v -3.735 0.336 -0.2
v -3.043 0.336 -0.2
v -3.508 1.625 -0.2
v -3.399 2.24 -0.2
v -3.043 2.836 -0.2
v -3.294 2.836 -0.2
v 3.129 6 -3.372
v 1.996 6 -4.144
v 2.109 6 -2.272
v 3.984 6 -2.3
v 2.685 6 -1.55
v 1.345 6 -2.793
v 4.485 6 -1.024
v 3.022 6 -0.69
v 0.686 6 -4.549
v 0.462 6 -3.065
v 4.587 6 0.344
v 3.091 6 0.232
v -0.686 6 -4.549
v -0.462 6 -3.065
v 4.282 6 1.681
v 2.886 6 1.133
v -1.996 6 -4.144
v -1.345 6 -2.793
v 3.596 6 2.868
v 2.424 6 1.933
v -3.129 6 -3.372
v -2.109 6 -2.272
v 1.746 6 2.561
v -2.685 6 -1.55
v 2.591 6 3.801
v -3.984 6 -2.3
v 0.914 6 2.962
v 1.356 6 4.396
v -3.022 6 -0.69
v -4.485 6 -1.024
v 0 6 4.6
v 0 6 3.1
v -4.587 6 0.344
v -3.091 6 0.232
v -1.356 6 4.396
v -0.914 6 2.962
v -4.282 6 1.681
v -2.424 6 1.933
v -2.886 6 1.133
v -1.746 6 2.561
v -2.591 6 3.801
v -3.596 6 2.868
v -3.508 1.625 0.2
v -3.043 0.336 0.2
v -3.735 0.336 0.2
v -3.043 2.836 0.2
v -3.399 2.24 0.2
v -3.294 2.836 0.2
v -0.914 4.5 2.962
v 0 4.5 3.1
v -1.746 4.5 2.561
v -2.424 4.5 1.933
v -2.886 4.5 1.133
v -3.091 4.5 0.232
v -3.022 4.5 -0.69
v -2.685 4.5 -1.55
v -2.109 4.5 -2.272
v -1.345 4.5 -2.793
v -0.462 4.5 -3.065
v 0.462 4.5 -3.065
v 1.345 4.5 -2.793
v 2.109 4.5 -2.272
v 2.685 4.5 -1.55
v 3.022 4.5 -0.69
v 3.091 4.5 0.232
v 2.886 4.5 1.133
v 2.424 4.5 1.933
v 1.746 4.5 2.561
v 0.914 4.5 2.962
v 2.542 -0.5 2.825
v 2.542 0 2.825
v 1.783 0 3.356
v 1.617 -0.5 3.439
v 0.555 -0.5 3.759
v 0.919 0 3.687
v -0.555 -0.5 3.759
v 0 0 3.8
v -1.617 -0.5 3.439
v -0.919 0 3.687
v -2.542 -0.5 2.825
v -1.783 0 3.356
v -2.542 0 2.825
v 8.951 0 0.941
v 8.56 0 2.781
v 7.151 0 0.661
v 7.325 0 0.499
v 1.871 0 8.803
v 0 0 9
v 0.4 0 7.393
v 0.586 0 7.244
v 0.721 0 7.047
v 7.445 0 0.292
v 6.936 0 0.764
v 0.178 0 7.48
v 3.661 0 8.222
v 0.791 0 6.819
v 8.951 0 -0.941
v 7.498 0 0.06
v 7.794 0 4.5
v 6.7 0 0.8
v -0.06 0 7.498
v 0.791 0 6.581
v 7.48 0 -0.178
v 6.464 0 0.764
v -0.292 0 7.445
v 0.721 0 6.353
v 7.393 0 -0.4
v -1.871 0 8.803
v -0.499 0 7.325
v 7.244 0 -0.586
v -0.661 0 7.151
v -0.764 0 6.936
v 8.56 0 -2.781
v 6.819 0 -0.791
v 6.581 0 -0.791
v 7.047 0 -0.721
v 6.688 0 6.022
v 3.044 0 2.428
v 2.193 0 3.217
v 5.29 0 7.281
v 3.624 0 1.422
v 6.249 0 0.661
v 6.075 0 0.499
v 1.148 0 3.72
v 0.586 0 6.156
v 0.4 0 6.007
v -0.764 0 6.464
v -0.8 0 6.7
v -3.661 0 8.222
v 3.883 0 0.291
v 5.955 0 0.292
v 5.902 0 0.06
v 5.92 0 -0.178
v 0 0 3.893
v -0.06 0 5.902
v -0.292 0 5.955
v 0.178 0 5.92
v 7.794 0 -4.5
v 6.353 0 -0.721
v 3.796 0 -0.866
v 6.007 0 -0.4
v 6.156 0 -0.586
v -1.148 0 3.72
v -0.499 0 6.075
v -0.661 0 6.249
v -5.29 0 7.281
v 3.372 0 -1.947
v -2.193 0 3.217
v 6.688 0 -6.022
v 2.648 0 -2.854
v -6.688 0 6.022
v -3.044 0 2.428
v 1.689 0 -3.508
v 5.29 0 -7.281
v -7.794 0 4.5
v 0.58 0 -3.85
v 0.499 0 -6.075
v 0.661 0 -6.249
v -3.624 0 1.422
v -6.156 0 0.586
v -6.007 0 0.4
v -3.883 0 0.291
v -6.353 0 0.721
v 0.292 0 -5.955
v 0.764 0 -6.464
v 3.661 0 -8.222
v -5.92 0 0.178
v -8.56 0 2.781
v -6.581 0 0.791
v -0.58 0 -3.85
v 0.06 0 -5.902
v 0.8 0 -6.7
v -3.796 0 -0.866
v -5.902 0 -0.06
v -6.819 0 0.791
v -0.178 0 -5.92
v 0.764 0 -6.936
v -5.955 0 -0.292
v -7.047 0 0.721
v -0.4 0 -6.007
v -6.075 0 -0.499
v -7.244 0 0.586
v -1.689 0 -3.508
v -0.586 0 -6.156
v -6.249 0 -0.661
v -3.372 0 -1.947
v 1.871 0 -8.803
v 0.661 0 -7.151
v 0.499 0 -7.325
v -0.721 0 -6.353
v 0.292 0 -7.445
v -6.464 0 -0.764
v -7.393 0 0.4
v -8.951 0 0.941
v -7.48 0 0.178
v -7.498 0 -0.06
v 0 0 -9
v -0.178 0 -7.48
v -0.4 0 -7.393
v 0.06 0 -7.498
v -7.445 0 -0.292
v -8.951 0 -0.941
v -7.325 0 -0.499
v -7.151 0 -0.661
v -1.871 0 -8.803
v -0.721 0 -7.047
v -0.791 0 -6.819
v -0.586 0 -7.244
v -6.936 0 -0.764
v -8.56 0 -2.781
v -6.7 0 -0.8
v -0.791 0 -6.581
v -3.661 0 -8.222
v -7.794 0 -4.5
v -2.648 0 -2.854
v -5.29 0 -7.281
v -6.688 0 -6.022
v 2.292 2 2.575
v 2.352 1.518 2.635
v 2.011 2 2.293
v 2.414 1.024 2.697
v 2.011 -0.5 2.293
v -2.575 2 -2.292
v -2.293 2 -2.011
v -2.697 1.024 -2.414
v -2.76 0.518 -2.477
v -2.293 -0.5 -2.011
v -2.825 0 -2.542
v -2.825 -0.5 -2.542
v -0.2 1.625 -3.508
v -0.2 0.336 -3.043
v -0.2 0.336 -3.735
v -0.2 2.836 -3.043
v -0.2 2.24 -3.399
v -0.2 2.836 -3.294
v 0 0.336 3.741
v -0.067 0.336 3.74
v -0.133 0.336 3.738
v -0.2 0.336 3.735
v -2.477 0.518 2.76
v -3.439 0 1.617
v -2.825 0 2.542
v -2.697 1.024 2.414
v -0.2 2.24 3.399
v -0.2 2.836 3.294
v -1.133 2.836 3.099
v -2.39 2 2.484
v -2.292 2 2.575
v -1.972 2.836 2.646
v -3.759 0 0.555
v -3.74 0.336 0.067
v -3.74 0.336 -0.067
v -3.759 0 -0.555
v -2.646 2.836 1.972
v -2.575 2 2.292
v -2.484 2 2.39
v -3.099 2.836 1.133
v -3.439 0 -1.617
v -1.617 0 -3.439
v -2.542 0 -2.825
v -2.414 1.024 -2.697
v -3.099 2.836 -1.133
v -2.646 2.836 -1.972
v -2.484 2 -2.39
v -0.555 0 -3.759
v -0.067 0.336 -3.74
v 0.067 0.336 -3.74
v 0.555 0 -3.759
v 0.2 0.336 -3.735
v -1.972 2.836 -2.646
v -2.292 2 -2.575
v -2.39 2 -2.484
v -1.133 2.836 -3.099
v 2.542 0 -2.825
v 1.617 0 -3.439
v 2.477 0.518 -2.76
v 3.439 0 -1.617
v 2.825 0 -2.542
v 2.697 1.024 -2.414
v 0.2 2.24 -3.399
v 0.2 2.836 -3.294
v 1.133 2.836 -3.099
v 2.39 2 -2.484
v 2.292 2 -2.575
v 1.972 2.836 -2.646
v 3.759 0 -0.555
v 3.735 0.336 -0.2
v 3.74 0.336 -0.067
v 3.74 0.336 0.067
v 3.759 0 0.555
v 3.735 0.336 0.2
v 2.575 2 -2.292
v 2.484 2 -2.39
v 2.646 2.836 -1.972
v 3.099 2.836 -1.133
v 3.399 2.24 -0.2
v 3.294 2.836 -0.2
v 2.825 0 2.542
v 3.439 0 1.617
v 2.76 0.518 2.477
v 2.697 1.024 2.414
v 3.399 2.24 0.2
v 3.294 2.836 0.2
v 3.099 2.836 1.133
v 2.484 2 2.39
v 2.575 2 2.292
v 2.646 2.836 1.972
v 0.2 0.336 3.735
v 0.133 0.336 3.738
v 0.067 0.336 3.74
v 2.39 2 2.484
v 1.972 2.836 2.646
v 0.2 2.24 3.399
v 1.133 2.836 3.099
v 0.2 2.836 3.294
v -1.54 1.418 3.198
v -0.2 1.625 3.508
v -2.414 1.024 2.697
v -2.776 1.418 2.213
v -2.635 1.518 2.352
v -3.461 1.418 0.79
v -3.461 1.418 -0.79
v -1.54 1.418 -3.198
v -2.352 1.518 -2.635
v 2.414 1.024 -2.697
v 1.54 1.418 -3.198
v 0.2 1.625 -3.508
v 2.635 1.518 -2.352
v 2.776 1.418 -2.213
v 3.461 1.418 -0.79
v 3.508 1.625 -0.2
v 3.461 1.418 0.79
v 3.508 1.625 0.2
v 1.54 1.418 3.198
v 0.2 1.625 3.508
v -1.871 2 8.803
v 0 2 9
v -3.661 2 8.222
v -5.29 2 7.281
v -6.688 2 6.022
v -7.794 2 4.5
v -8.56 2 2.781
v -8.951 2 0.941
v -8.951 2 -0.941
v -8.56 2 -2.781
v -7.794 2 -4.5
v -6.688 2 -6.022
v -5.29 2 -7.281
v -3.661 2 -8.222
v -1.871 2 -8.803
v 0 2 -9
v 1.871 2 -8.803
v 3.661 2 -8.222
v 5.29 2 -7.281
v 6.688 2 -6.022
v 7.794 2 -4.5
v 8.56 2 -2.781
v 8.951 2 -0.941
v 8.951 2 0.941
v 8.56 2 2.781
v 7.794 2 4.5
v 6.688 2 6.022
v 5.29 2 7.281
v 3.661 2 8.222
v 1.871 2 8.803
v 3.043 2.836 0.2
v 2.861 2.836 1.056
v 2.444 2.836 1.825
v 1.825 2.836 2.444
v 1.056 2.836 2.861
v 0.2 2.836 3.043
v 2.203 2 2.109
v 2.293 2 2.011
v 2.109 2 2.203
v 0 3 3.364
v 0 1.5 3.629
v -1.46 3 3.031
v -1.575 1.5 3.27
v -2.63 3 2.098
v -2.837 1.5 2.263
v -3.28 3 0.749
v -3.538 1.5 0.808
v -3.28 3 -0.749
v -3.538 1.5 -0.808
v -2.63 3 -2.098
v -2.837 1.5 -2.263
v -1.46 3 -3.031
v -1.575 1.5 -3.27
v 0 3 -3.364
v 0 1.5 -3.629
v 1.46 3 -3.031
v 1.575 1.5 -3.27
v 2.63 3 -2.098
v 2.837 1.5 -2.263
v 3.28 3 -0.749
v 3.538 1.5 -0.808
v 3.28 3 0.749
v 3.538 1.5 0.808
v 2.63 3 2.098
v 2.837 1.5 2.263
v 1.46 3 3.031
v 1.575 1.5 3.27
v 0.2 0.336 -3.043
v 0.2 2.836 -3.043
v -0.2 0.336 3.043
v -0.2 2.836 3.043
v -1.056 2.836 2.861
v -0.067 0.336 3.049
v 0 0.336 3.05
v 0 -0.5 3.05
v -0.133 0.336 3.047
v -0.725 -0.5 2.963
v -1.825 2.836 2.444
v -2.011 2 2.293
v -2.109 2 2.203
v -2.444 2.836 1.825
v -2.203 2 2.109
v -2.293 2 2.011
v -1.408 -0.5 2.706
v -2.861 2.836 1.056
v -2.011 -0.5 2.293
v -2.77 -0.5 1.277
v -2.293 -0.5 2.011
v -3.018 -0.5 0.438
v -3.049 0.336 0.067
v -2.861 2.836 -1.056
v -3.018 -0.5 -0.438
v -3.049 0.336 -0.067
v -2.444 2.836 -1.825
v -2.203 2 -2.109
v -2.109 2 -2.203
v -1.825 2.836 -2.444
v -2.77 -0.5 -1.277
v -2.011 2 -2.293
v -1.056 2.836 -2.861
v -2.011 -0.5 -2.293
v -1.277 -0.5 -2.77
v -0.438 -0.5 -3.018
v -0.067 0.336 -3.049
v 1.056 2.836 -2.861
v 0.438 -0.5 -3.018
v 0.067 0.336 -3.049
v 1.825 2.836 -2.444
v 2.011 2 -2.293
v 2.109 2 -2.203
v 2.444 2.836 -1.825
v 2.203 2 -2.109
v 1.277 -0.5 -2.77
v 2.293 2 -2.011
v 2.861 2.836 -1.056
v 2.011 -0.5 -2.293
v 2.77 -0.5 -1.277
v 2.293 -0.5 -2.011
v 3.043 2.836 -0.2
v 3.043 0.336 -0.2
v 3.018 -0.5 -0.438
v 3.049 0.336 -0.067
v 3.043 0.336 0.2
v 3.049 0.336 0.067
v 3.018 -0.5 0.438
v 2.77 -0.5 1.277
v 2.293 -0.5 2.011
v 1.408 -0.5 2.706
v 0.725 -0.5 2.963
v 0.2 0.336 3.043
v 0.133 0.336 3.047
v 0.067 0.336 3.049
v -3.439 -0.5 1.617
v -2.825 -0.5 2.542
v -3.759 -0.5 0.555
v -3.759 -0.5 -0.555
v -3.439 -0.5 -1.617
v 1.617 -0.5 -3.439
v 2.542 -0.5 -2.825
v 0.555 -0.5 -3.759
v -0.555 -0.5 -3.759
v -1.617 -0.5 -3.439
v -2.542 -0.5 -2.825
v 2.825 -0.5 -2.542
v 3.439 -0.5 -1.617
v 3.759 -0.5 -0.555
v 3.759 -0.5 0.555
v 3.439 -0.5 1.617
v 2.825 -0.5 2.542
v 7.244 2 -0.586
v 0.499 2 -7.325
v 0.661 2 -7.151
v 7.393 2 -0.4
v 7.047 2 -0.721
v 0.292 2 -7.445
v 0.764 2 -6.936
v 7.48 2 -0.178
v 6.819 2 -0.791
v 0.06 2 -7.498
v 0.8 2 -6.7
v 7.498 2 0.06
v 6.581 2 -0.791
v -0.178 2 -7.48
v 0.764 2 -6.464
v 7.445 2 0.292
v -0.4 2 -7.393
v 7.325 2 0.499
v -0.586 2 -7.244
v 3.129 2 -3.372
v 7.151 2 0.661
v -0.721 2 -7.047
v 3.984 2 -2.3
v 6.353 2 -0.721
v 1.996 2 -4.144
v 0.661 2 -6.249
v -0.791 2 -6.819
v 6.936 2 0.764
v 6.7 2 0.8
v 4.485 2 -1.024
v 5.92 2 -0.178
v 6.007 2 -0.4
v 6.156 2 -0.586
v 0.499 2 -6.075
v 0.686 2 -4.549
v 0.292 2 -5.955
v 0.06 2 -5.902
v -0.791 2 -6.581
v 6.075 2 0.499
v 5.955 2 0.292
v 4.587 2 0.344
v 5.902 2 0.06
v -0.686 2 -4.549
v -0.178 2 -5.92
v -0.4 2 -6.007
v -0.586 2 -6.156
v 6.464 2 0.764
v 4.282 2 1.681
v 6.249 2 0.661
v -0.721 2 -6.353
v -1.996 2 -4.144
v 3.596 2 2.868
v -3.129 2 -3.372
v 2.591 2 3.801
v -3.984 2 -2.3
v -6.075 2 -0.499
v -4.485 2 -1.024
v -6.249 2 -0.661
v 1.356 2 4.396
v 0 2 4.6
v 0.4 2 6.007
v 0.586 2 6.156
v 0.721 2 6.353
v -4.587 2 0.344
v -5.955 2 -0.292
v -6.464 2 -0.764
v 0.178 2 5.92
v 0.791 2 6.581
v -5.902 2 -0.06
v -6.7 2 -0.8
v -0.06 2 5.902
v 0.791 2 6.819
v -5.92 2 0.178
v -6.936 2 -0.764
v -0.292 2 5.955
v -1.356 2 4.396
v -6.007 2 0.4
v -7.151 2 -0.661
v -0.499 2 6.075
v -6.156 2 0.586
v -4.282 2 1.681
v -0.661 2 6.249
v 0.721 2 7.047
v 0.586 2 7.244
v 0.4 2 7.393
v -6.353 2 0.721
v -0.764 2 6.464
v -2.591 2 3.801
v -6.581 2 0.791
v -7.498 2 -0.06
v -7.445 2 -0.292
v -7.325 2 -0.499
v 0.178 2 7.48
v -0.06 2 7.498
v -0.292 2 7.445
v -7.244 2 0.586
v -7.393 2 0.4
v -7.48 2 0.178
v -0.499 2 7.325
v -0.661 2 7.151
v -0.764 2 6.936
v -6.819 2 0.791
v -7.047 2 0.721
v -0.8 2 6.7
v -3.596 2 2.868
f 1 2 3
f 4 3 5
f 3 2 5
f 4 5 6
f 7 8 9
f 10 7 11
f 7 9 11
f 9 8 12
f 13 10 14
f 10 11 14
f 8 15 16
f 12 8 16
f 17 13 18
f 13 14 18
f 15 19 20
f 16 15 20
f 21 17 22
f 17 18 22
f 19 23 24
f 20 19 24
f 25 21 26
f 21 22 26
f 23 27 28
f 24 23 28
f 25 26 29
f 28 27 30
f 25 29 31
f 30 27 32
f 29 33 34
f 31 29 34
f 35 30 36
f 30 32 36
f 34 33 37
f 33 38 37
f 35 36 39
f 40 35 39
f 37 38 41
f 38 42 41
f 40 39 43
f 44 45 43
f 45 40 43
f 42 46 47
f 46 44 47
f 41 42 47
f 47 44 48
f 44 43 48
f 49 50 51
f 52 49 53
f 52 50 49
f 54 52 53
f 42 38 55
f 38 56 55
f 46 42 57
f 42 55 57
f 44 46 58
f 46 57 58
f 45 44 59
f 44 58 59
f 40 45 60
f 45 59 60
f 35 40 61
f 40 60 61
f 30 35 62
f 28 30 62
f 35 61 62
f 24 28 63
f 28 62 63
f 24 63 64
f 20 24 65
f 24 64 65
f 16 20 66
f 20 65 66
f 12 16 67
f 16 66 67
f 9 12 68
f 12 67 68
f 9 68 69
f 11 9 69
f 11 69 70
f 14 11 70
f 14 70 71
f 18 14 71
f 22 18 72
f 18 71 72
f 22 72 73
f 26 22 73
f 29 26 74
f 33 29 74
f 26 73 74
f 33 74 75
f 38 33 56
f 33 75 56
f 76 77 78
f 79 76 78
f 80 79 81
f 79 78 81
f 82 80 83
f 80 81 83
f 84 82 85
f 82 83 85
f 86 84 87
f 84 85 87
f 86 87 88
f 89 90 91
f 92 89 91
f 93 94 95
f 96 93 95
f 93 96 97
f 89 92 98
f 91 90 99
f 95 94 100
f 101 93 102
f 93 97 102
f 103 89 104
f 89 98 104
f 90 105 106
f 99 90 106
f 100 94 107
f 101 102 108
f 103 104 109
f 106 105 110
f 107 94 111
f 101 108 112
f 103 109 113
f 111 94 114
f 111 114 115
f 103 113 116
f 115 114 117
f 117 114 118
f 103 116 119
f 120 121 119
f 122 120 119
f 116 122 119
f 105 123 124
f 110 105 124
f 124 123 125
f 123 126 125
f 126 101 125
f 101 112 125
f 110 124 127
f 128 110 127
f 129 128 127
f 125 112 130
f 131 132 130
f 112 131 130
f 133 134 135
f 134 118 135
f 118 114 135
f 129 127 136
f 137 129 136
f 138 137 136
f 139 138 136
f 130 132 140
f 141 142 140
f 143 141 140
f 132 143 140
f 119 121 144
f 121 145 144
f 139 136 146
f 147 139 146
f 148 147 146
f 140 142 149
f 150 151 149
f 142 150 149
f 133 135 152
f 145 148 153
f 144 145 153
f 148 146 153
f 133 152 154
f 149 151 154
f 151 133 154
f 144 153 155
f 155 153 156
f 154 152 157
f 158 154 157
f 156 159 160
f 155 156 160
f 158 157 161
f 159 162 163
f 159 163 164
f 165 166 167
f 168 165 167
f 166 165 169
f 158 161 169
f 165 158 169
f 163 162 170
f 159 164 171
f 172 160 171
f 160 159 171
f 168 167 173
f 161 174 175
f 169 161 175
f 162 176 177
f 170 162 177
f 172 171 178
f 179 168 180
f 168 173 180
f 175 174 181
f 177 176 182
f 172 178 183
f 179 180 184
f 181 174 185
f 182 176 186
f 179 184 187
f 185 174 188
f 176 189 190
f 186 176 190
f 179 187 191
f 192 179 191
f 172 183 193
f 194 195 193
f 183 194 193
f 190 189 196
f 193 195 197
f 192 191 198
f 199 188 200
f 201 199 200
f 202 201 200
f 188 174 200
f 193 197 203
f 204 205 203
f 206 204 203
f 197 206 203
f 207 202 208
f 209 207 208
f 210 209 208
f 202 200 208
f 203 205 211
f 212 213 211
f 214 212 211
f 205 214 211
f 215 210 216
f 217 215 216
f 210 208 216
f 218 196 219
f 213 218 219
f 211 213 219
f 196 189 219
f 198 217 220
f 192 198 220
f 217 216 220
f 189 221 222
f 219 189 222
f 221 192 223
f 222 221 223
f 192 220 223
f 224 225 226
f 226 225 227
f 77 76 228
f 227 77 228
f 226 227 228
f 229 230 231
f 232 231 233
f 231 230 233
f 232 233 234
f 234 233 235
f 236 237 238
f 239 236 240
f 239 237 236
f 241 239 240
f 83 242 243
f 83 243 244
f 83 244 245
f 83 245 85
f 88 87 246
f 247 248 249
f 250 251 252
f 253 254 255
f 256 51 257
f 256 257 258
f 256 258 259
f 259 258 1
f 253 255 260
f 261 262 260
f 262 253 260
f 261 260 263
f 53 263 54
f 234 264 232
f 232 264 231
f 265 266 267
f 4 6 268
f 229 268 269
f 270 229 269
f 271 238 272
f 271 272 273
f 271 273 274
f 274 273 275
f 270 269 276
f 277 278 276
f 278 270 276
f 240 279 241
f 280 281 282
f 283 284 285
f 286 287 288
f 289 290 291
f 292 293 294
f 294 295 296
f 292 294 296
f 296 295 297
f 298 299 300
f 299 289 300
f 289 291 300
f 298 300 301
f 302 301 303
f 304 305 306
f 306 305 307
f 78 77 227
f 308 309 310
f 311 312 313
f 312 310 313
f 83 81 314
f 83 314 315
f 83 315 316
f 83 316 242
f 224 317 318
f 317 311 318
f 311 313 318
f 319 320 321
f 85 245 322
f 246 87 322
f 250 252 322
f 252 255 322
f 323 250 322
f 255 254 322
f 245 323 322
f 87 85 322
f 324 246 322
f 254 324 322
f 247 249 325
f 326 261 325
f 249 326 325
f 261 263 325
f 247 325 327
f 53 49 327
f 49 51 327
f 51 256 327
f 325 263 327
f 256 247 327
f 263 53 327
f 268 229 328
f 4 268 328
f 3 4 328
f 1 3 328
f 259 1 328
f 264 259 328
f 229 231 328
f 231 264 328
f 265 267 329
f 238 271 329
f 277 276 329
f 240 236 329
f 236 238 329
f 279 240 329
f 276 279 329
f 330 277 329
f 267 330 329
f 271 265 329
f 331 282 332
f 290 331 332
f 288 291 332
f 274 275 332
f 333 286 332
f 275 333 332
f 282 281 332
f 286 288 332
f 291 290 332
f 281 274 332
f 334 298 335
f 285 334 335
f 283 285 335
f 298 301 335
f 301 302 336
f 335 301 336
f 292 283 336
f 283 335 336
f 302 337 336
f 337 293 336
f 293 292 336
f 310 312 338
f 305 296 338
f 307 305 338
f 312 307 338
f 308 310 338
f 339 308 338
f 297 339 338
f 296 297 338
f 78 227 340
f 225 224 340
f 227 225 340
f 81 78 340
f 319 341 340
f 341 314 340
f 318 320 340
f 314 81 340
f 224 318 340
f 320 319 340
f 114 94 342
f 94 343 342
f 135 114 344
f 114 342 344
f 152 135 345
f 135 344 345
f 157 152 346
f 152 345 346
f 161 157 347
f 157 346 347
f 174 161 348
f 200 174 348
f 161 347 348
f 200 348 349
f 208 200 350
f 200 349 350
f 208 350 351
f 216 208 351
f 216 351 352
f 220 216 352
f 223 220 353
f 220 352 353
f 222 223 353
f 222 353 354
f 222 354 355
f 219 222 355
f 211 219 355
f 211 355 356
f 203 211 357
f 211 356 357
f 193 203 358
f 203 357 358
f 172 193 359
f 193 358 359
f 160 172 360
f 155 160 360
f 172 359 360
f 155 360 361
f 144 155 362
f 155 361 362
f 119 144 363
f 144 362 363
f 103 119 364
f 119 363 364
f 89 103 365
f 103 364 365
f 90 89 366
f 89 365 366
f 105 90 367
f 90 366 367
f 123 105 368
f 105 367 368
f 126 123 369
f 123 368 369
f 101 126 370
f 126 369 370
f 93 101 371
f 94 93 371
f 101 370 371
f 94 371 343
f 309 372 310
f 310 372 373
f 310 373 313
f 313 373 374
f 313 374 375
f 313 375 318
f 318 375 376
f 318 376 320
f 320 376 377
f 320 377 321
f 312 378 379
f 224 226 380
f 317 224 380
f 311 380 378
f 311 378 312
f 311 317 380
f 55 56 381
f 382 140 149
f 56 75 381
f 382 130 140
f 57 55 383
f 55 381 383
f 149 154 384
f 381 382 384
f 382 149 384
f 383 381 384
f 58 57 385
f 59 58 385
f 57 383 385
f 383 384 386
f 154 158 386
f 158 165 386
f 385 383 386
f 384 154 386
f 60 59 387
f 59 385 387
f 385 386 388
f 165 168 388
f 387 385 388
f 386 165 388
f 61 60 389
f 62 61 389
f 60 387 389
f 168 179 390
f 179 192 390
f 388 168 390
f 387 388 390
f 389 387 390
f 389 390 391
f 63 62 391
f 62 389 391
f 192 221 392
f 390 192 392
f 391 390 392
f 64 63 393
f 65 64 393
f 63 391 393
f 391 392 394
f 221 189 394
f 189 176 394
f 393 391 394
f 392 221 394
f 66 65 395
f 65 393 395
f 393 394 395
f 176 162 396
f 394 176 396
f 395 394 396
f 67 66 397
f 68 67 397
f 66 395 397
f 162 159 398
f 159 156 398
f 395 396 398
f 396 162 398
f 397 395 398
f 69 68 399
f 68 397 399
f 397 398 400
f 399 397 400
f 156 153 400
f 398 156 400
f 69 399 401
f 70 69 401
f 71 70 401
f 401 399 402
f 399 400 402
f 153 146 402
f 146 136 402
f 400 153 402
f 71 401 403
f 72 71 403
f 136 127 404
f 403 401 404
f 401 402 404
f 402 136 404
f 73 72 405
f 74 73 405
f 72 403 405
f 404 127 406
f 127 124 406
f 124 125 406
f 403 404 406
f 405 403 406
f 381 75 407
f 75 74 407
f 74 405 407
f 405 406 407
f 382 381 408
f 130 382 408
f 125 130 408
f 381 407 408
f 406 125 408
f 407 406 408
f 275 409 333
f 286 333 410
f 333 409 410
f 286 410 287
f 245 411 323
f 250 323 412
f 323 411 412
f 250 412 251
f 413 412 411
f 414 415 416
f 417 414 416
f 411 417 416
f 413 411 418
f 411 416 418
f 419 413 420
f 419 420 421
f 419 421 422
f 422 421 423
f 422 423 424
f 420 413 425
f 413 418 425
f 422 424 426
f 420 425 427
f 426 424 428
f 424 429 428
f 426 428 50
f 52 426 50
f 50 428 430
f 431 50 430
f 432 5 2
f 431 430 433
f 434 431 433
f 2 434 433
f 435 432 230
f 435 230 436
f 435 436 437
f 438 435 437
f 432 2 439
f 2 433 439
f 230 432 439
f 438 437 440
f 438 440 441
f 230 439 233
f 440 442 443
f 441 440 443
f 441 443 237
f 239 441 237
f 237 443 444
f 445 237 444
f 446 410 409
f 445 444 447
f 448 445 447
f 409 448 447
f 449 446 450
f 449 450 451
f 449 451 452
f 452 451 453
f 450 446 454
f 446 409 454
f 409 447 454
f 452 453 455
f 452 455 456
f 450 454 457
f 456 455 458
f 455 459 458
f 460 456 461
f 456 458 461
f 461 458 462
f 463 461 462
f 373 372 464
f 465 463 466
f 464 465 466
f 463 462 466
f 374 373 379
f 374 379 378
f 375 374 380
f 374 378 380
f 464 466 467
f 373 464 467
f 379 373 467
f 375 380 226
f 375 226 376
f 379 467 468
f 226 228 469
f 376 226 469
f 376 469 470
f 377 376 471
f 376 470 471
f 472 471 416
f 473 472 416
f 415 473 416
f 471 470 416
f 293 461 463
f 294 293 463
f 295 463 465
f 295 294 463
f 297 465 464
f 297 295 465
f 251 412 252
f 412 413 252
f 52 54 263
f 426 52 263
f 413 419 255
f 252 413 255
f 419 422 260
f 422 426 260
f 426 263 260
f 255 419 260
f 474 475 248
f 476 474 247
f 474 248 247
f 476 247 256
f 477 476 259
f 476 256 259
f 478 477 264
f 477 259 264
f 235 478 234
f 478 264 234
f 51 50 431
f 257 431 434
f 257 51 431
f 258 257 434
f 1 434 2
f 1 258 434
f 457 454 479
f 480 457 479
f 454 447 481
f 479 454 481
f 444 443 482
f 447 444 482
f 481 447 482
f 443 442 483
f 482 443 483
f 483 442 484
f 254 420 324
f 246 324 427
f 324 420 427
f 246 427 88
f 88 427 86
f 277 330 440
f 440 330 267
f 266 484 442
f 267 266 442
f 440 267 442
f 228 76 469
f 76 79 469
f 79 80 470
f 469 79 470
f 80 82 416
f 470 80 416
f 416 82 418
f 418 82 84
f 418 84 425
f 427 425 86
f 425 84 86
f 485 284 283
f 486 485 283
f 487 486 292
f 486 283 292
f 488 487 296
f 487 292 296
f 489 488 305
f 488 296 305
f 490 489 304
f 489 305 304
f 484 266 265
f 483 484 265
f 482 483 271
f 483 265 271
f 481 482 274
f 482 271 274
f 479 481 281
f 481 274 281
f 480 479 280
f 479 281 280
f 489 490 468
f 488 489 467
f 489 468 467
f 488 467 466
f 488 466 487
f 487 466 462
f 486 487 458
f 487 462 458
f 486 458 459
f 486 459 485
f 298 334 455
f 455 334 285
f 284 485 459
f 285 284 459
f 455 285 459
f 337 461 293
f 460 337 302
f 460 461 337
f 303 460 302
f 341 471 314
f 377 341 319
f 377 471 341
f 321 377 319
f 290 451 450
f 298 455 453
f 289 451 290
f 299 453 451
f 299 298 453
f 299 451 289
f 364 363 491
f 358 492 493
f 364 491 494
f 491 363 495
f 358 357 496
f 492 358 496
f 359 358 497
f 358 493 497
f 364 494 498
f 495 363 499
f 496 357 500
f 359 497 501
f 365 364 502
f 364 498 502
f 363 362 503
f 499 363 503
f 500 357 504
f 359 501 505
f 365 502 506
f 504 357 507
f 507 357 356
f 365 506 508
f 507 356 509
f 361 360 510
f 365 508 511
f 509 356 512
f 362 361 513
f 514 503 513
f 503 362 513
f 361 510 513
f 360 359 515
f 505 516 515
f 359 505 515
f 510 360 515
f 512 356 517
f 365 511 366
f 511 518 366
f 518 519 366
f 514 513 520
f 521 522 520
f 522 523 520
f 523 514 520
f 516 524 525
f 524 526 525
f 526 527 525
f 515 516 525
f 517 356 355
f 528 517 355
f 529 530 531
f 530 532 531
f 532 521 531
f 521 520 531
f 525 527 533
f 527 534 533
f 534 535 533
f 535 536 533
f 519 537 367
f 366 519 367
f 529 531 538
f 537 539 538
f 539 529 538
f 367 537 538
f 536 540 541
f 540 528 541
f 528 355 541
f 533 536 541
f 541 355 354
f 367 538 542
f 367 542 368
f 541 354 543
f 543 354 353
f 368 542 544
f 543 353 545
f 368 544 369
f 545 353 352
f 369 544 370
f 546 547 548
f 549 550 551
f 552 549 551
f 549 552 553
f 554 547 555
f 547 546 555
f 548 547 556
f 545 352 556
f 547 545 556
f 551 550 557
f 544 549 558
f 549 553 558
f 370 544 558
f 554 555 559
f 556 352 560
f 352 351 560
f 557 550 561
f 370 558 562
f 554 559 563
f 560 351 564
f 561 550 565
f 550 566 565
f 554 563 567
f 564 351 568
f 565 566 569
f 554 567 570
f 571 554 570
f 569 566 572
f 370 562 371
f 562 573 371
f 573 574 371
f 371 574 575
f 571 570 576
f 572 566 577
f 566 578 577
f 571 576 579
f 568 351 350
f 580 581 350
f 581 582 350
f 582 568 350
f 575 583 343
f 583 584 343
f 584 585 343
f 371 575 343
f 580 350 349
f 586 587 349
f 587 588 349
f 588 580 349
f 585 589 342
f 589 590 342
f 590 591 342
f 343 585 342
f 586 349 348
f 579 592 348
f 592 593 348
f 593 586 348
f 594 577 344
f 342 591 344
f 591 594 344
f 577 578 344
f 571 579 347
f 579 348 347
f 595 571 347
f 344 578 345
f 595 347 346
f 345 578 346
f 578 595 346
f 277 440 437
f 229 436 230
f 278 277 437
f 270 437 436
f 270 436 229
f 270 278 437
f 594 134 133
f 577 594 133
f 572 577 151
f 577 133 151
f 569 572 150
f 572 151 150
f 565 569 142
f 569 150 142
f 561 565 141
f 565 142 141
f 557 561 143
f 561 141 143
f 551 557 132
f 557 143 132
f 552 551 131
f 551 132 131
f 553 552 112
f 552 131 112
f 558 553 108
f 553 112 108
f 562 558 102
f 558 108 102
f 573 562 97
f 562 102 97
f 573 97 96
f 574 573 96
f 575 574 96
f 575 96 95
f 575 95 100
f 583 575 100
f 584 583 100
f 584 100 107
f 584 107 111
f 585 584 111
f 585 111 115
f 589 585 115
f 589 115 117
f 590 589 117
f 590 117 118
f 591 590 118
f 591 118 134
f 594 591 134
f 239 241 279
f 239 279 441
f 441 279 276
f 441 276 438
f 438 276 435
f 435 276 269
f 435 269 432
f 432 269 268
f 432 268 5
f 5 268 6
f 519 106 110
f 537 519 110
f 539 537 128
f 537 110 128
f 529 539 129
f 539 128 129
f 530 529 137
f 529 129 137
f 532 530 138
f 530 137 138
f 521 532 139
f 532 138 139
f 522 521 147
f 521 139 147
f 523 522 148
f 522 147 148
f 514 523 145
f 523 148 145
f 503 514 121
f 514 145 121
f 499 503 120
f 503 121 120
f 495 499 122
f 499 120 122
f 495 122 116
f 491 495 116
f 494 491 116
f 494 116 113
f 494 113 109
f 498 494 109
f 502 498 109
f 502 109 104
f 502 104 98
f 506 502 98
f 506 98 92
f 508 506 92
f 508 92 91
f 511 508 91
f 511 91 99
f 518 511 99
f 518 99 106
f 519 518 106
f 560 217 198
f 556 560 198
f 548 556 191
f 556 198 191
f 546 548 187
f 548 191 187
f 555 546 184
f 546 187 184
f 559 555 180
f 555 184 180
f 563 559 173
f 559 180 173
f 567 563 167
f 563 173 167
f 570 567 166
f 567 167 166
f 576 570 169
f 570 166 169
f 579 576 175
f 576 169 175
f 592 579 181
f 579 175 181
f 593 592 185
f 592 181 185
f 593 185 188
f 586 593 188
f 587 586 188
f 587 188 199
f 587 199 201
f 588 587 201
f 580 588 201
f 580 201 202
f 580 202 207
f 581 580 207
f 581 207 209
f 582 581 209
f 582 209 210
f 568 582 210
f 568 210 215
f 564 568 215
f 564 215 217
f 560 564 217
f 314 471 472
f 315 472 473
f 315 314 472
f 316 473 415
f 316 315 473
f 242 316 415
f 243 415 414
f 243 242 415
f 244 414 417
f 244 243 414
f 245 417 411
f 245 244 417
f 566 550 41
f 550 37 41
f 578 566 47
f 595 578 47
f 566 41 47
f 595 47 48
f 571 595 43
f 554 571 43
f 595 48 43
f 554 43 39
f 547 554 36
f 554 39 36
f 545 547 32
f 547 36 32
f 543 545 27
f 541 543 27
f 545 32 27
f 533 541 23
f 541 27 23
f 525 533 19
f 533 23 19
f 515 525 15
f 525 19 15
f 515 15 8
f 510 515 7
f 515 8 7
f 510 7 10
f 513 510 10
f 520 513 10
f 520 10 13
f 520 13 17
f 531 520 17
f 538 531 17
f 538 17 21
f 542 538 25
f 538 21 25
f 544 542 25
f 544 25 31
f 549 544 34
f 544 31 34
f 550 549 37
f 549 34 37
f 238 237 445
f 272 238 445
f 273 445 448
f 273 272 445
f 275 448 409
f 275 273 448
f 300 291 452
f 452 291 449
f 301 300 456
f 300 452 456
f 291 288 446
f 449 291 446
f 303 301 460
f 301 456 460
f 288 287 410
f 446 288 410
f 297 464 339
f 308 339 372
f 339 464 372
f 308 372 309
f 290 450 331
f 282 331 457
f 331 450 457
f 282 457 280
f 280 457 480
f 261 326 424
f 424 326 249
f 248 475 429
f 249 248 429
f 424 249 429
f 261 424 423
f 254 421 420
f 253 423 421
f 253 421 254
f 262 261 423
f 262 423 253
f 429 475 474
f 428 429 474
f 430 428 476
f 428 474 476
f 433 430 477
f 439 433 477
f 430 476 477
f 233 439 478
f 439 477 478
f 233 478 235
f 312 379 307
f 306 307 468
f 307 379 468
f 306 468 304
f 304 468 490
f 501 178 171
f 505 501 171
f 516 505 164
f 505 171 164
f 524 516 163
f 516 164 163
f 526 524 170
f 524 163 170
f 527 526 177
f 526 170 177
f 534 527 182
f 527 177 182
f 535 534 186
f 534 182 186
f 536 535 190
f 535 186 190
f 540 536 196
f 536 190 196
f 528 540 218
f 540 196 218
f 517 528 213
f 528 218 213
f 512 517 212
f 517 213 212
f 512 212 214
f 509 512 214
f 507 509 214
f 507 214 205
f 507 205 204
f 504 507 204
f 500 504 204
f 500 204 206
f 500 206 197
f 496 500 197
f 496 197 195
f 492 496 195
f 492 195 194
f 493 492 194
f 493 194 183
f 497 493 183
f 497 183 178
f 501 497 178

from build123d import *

# Parameters (mm, degrees)
M2X0_4_TAPPED_HOLE1_D   = 1.6
CIRPATTERN1_COUNT       = 4
SKETCH7_W               = 0.4
SKETCH7_H               = 6
CUT_EXTRUDE_THIN1_DEPTH = 2.5
CUT_EXTRUDE_THIN2_DEPTH = 2.5
CIRPATTERN2_COUNT       = 4


with BuildPart() as part:
    # Sketch2 → Revolve1 (revolve)
    with BuildSketch(Plane(origin=(0, 0, 0), x_dir=(0, 0, -1), z_dir=(1, 0, 0))):
        Polygon((-3.1, 6), (-3.1, 4.5), (-3.893471413, 0), (-9, 0), (-9, 2), (-4.6, 2), (-4.6, 6), align=None)
    revolve(axis=Axis((0, 8.4, 0), (0, -1, 0)))

    # M2x0.4 Tapped Hole1 (through all)
    with Locations(Plane(origin=(0, 2, 0), x_dir=(1, 0, 0), z_dir=(0, 1, 0))):
        with Locations((0, -6.7)):
            m2x0_4_tapped_hole1 = Hole(M2X0_4_TAPPED_HOLE1_D / 2)

    # CirPattern1: M2x0.4 Tapped Hole1 ×4 about axis
    cirpattern1_axis = Axis((0, 0, 0), (0, 1, 0))
    for i in range(1, CIRPATTERN1_COUNT):
        add(m2x0_4_tapped_hole1.rotate(cirpattern1_axis, i * 360 / CIRPATTERN1_COUNT), mode=Mode.SUBTRACT)


with BuildPart() as body_2:
    # Sketch6 → Revolve2 (revolve)
    with BuildSketch(Plane.XY, mode=Mode.PRIVATE) as revolve2_sk:
        Polygon((3.05, 2.83564091), (3.05, -0.5), (3.8, -0.5), (3.8, 0), (3.3, 2.83564091), align=None)
    revolve(revolve2_sk.sketch.rotate(Axis((0, 8.4, 0), (0, -1, 0)), 90), axis=Axis((0, 8.4, 0), (0, -1, 0)))

    # Sketch7 → Cut-Extrude-Thin1 (cut)
    with BuildSketch(Plane(origin=(0, 2.83564091, 0), x_dir=(1, 0, 0), z_dir=(0, 1, 0))):
        with Locations((0, 3)):
            Rectangle(SKETCH7_W, SKETCH7_H)
    cut_extrude_thin1 = extrude(amount=-CUT_EXTRUDE_THIN1_DEPTH, mode=Mode.SUBTRACT)

    # Sketch8 → Cut-Extrude-Thin2 (cut)
    with BuildSketch(Plane.XZ.offset(0.5)):
        Polygon((0.141421356, -0.141421356), (4.384062043, 4.101219331), (4.101219331, 4.384062043), (-0.141421356, 0.141421356), align=None)
    cut_extrude_thin2 = extrude(amount=-CUT_EXTRUDE_THIN2_DEPTH, mode=Mode.SUBTRACT)

    # CirPattern2: Cut-Extrude-Thin1, Cut-Extrude-Thin2 ×4 about axis
    cirpattern2_axis = Axis((0, 0, 0), (0, 1, 0))
    add([cut_extrude_thin1.rotate(cirpattern2_axis, i * 360 / CIRPATTERN2_COUNT) for i in range(1, CIRPATTERN2_COUNT)], mode=Mode.SUBTRACT)
    add([cut_extrude_thin2.rotate(cirpattern2_axis, i * 360 / CIRPATTERN2_COUNT) for i in range(1, CIRPATTERN2_COUNT)], mode=Mode.SUBTRACT)


solid = Compound([part.part, body_2.part])
